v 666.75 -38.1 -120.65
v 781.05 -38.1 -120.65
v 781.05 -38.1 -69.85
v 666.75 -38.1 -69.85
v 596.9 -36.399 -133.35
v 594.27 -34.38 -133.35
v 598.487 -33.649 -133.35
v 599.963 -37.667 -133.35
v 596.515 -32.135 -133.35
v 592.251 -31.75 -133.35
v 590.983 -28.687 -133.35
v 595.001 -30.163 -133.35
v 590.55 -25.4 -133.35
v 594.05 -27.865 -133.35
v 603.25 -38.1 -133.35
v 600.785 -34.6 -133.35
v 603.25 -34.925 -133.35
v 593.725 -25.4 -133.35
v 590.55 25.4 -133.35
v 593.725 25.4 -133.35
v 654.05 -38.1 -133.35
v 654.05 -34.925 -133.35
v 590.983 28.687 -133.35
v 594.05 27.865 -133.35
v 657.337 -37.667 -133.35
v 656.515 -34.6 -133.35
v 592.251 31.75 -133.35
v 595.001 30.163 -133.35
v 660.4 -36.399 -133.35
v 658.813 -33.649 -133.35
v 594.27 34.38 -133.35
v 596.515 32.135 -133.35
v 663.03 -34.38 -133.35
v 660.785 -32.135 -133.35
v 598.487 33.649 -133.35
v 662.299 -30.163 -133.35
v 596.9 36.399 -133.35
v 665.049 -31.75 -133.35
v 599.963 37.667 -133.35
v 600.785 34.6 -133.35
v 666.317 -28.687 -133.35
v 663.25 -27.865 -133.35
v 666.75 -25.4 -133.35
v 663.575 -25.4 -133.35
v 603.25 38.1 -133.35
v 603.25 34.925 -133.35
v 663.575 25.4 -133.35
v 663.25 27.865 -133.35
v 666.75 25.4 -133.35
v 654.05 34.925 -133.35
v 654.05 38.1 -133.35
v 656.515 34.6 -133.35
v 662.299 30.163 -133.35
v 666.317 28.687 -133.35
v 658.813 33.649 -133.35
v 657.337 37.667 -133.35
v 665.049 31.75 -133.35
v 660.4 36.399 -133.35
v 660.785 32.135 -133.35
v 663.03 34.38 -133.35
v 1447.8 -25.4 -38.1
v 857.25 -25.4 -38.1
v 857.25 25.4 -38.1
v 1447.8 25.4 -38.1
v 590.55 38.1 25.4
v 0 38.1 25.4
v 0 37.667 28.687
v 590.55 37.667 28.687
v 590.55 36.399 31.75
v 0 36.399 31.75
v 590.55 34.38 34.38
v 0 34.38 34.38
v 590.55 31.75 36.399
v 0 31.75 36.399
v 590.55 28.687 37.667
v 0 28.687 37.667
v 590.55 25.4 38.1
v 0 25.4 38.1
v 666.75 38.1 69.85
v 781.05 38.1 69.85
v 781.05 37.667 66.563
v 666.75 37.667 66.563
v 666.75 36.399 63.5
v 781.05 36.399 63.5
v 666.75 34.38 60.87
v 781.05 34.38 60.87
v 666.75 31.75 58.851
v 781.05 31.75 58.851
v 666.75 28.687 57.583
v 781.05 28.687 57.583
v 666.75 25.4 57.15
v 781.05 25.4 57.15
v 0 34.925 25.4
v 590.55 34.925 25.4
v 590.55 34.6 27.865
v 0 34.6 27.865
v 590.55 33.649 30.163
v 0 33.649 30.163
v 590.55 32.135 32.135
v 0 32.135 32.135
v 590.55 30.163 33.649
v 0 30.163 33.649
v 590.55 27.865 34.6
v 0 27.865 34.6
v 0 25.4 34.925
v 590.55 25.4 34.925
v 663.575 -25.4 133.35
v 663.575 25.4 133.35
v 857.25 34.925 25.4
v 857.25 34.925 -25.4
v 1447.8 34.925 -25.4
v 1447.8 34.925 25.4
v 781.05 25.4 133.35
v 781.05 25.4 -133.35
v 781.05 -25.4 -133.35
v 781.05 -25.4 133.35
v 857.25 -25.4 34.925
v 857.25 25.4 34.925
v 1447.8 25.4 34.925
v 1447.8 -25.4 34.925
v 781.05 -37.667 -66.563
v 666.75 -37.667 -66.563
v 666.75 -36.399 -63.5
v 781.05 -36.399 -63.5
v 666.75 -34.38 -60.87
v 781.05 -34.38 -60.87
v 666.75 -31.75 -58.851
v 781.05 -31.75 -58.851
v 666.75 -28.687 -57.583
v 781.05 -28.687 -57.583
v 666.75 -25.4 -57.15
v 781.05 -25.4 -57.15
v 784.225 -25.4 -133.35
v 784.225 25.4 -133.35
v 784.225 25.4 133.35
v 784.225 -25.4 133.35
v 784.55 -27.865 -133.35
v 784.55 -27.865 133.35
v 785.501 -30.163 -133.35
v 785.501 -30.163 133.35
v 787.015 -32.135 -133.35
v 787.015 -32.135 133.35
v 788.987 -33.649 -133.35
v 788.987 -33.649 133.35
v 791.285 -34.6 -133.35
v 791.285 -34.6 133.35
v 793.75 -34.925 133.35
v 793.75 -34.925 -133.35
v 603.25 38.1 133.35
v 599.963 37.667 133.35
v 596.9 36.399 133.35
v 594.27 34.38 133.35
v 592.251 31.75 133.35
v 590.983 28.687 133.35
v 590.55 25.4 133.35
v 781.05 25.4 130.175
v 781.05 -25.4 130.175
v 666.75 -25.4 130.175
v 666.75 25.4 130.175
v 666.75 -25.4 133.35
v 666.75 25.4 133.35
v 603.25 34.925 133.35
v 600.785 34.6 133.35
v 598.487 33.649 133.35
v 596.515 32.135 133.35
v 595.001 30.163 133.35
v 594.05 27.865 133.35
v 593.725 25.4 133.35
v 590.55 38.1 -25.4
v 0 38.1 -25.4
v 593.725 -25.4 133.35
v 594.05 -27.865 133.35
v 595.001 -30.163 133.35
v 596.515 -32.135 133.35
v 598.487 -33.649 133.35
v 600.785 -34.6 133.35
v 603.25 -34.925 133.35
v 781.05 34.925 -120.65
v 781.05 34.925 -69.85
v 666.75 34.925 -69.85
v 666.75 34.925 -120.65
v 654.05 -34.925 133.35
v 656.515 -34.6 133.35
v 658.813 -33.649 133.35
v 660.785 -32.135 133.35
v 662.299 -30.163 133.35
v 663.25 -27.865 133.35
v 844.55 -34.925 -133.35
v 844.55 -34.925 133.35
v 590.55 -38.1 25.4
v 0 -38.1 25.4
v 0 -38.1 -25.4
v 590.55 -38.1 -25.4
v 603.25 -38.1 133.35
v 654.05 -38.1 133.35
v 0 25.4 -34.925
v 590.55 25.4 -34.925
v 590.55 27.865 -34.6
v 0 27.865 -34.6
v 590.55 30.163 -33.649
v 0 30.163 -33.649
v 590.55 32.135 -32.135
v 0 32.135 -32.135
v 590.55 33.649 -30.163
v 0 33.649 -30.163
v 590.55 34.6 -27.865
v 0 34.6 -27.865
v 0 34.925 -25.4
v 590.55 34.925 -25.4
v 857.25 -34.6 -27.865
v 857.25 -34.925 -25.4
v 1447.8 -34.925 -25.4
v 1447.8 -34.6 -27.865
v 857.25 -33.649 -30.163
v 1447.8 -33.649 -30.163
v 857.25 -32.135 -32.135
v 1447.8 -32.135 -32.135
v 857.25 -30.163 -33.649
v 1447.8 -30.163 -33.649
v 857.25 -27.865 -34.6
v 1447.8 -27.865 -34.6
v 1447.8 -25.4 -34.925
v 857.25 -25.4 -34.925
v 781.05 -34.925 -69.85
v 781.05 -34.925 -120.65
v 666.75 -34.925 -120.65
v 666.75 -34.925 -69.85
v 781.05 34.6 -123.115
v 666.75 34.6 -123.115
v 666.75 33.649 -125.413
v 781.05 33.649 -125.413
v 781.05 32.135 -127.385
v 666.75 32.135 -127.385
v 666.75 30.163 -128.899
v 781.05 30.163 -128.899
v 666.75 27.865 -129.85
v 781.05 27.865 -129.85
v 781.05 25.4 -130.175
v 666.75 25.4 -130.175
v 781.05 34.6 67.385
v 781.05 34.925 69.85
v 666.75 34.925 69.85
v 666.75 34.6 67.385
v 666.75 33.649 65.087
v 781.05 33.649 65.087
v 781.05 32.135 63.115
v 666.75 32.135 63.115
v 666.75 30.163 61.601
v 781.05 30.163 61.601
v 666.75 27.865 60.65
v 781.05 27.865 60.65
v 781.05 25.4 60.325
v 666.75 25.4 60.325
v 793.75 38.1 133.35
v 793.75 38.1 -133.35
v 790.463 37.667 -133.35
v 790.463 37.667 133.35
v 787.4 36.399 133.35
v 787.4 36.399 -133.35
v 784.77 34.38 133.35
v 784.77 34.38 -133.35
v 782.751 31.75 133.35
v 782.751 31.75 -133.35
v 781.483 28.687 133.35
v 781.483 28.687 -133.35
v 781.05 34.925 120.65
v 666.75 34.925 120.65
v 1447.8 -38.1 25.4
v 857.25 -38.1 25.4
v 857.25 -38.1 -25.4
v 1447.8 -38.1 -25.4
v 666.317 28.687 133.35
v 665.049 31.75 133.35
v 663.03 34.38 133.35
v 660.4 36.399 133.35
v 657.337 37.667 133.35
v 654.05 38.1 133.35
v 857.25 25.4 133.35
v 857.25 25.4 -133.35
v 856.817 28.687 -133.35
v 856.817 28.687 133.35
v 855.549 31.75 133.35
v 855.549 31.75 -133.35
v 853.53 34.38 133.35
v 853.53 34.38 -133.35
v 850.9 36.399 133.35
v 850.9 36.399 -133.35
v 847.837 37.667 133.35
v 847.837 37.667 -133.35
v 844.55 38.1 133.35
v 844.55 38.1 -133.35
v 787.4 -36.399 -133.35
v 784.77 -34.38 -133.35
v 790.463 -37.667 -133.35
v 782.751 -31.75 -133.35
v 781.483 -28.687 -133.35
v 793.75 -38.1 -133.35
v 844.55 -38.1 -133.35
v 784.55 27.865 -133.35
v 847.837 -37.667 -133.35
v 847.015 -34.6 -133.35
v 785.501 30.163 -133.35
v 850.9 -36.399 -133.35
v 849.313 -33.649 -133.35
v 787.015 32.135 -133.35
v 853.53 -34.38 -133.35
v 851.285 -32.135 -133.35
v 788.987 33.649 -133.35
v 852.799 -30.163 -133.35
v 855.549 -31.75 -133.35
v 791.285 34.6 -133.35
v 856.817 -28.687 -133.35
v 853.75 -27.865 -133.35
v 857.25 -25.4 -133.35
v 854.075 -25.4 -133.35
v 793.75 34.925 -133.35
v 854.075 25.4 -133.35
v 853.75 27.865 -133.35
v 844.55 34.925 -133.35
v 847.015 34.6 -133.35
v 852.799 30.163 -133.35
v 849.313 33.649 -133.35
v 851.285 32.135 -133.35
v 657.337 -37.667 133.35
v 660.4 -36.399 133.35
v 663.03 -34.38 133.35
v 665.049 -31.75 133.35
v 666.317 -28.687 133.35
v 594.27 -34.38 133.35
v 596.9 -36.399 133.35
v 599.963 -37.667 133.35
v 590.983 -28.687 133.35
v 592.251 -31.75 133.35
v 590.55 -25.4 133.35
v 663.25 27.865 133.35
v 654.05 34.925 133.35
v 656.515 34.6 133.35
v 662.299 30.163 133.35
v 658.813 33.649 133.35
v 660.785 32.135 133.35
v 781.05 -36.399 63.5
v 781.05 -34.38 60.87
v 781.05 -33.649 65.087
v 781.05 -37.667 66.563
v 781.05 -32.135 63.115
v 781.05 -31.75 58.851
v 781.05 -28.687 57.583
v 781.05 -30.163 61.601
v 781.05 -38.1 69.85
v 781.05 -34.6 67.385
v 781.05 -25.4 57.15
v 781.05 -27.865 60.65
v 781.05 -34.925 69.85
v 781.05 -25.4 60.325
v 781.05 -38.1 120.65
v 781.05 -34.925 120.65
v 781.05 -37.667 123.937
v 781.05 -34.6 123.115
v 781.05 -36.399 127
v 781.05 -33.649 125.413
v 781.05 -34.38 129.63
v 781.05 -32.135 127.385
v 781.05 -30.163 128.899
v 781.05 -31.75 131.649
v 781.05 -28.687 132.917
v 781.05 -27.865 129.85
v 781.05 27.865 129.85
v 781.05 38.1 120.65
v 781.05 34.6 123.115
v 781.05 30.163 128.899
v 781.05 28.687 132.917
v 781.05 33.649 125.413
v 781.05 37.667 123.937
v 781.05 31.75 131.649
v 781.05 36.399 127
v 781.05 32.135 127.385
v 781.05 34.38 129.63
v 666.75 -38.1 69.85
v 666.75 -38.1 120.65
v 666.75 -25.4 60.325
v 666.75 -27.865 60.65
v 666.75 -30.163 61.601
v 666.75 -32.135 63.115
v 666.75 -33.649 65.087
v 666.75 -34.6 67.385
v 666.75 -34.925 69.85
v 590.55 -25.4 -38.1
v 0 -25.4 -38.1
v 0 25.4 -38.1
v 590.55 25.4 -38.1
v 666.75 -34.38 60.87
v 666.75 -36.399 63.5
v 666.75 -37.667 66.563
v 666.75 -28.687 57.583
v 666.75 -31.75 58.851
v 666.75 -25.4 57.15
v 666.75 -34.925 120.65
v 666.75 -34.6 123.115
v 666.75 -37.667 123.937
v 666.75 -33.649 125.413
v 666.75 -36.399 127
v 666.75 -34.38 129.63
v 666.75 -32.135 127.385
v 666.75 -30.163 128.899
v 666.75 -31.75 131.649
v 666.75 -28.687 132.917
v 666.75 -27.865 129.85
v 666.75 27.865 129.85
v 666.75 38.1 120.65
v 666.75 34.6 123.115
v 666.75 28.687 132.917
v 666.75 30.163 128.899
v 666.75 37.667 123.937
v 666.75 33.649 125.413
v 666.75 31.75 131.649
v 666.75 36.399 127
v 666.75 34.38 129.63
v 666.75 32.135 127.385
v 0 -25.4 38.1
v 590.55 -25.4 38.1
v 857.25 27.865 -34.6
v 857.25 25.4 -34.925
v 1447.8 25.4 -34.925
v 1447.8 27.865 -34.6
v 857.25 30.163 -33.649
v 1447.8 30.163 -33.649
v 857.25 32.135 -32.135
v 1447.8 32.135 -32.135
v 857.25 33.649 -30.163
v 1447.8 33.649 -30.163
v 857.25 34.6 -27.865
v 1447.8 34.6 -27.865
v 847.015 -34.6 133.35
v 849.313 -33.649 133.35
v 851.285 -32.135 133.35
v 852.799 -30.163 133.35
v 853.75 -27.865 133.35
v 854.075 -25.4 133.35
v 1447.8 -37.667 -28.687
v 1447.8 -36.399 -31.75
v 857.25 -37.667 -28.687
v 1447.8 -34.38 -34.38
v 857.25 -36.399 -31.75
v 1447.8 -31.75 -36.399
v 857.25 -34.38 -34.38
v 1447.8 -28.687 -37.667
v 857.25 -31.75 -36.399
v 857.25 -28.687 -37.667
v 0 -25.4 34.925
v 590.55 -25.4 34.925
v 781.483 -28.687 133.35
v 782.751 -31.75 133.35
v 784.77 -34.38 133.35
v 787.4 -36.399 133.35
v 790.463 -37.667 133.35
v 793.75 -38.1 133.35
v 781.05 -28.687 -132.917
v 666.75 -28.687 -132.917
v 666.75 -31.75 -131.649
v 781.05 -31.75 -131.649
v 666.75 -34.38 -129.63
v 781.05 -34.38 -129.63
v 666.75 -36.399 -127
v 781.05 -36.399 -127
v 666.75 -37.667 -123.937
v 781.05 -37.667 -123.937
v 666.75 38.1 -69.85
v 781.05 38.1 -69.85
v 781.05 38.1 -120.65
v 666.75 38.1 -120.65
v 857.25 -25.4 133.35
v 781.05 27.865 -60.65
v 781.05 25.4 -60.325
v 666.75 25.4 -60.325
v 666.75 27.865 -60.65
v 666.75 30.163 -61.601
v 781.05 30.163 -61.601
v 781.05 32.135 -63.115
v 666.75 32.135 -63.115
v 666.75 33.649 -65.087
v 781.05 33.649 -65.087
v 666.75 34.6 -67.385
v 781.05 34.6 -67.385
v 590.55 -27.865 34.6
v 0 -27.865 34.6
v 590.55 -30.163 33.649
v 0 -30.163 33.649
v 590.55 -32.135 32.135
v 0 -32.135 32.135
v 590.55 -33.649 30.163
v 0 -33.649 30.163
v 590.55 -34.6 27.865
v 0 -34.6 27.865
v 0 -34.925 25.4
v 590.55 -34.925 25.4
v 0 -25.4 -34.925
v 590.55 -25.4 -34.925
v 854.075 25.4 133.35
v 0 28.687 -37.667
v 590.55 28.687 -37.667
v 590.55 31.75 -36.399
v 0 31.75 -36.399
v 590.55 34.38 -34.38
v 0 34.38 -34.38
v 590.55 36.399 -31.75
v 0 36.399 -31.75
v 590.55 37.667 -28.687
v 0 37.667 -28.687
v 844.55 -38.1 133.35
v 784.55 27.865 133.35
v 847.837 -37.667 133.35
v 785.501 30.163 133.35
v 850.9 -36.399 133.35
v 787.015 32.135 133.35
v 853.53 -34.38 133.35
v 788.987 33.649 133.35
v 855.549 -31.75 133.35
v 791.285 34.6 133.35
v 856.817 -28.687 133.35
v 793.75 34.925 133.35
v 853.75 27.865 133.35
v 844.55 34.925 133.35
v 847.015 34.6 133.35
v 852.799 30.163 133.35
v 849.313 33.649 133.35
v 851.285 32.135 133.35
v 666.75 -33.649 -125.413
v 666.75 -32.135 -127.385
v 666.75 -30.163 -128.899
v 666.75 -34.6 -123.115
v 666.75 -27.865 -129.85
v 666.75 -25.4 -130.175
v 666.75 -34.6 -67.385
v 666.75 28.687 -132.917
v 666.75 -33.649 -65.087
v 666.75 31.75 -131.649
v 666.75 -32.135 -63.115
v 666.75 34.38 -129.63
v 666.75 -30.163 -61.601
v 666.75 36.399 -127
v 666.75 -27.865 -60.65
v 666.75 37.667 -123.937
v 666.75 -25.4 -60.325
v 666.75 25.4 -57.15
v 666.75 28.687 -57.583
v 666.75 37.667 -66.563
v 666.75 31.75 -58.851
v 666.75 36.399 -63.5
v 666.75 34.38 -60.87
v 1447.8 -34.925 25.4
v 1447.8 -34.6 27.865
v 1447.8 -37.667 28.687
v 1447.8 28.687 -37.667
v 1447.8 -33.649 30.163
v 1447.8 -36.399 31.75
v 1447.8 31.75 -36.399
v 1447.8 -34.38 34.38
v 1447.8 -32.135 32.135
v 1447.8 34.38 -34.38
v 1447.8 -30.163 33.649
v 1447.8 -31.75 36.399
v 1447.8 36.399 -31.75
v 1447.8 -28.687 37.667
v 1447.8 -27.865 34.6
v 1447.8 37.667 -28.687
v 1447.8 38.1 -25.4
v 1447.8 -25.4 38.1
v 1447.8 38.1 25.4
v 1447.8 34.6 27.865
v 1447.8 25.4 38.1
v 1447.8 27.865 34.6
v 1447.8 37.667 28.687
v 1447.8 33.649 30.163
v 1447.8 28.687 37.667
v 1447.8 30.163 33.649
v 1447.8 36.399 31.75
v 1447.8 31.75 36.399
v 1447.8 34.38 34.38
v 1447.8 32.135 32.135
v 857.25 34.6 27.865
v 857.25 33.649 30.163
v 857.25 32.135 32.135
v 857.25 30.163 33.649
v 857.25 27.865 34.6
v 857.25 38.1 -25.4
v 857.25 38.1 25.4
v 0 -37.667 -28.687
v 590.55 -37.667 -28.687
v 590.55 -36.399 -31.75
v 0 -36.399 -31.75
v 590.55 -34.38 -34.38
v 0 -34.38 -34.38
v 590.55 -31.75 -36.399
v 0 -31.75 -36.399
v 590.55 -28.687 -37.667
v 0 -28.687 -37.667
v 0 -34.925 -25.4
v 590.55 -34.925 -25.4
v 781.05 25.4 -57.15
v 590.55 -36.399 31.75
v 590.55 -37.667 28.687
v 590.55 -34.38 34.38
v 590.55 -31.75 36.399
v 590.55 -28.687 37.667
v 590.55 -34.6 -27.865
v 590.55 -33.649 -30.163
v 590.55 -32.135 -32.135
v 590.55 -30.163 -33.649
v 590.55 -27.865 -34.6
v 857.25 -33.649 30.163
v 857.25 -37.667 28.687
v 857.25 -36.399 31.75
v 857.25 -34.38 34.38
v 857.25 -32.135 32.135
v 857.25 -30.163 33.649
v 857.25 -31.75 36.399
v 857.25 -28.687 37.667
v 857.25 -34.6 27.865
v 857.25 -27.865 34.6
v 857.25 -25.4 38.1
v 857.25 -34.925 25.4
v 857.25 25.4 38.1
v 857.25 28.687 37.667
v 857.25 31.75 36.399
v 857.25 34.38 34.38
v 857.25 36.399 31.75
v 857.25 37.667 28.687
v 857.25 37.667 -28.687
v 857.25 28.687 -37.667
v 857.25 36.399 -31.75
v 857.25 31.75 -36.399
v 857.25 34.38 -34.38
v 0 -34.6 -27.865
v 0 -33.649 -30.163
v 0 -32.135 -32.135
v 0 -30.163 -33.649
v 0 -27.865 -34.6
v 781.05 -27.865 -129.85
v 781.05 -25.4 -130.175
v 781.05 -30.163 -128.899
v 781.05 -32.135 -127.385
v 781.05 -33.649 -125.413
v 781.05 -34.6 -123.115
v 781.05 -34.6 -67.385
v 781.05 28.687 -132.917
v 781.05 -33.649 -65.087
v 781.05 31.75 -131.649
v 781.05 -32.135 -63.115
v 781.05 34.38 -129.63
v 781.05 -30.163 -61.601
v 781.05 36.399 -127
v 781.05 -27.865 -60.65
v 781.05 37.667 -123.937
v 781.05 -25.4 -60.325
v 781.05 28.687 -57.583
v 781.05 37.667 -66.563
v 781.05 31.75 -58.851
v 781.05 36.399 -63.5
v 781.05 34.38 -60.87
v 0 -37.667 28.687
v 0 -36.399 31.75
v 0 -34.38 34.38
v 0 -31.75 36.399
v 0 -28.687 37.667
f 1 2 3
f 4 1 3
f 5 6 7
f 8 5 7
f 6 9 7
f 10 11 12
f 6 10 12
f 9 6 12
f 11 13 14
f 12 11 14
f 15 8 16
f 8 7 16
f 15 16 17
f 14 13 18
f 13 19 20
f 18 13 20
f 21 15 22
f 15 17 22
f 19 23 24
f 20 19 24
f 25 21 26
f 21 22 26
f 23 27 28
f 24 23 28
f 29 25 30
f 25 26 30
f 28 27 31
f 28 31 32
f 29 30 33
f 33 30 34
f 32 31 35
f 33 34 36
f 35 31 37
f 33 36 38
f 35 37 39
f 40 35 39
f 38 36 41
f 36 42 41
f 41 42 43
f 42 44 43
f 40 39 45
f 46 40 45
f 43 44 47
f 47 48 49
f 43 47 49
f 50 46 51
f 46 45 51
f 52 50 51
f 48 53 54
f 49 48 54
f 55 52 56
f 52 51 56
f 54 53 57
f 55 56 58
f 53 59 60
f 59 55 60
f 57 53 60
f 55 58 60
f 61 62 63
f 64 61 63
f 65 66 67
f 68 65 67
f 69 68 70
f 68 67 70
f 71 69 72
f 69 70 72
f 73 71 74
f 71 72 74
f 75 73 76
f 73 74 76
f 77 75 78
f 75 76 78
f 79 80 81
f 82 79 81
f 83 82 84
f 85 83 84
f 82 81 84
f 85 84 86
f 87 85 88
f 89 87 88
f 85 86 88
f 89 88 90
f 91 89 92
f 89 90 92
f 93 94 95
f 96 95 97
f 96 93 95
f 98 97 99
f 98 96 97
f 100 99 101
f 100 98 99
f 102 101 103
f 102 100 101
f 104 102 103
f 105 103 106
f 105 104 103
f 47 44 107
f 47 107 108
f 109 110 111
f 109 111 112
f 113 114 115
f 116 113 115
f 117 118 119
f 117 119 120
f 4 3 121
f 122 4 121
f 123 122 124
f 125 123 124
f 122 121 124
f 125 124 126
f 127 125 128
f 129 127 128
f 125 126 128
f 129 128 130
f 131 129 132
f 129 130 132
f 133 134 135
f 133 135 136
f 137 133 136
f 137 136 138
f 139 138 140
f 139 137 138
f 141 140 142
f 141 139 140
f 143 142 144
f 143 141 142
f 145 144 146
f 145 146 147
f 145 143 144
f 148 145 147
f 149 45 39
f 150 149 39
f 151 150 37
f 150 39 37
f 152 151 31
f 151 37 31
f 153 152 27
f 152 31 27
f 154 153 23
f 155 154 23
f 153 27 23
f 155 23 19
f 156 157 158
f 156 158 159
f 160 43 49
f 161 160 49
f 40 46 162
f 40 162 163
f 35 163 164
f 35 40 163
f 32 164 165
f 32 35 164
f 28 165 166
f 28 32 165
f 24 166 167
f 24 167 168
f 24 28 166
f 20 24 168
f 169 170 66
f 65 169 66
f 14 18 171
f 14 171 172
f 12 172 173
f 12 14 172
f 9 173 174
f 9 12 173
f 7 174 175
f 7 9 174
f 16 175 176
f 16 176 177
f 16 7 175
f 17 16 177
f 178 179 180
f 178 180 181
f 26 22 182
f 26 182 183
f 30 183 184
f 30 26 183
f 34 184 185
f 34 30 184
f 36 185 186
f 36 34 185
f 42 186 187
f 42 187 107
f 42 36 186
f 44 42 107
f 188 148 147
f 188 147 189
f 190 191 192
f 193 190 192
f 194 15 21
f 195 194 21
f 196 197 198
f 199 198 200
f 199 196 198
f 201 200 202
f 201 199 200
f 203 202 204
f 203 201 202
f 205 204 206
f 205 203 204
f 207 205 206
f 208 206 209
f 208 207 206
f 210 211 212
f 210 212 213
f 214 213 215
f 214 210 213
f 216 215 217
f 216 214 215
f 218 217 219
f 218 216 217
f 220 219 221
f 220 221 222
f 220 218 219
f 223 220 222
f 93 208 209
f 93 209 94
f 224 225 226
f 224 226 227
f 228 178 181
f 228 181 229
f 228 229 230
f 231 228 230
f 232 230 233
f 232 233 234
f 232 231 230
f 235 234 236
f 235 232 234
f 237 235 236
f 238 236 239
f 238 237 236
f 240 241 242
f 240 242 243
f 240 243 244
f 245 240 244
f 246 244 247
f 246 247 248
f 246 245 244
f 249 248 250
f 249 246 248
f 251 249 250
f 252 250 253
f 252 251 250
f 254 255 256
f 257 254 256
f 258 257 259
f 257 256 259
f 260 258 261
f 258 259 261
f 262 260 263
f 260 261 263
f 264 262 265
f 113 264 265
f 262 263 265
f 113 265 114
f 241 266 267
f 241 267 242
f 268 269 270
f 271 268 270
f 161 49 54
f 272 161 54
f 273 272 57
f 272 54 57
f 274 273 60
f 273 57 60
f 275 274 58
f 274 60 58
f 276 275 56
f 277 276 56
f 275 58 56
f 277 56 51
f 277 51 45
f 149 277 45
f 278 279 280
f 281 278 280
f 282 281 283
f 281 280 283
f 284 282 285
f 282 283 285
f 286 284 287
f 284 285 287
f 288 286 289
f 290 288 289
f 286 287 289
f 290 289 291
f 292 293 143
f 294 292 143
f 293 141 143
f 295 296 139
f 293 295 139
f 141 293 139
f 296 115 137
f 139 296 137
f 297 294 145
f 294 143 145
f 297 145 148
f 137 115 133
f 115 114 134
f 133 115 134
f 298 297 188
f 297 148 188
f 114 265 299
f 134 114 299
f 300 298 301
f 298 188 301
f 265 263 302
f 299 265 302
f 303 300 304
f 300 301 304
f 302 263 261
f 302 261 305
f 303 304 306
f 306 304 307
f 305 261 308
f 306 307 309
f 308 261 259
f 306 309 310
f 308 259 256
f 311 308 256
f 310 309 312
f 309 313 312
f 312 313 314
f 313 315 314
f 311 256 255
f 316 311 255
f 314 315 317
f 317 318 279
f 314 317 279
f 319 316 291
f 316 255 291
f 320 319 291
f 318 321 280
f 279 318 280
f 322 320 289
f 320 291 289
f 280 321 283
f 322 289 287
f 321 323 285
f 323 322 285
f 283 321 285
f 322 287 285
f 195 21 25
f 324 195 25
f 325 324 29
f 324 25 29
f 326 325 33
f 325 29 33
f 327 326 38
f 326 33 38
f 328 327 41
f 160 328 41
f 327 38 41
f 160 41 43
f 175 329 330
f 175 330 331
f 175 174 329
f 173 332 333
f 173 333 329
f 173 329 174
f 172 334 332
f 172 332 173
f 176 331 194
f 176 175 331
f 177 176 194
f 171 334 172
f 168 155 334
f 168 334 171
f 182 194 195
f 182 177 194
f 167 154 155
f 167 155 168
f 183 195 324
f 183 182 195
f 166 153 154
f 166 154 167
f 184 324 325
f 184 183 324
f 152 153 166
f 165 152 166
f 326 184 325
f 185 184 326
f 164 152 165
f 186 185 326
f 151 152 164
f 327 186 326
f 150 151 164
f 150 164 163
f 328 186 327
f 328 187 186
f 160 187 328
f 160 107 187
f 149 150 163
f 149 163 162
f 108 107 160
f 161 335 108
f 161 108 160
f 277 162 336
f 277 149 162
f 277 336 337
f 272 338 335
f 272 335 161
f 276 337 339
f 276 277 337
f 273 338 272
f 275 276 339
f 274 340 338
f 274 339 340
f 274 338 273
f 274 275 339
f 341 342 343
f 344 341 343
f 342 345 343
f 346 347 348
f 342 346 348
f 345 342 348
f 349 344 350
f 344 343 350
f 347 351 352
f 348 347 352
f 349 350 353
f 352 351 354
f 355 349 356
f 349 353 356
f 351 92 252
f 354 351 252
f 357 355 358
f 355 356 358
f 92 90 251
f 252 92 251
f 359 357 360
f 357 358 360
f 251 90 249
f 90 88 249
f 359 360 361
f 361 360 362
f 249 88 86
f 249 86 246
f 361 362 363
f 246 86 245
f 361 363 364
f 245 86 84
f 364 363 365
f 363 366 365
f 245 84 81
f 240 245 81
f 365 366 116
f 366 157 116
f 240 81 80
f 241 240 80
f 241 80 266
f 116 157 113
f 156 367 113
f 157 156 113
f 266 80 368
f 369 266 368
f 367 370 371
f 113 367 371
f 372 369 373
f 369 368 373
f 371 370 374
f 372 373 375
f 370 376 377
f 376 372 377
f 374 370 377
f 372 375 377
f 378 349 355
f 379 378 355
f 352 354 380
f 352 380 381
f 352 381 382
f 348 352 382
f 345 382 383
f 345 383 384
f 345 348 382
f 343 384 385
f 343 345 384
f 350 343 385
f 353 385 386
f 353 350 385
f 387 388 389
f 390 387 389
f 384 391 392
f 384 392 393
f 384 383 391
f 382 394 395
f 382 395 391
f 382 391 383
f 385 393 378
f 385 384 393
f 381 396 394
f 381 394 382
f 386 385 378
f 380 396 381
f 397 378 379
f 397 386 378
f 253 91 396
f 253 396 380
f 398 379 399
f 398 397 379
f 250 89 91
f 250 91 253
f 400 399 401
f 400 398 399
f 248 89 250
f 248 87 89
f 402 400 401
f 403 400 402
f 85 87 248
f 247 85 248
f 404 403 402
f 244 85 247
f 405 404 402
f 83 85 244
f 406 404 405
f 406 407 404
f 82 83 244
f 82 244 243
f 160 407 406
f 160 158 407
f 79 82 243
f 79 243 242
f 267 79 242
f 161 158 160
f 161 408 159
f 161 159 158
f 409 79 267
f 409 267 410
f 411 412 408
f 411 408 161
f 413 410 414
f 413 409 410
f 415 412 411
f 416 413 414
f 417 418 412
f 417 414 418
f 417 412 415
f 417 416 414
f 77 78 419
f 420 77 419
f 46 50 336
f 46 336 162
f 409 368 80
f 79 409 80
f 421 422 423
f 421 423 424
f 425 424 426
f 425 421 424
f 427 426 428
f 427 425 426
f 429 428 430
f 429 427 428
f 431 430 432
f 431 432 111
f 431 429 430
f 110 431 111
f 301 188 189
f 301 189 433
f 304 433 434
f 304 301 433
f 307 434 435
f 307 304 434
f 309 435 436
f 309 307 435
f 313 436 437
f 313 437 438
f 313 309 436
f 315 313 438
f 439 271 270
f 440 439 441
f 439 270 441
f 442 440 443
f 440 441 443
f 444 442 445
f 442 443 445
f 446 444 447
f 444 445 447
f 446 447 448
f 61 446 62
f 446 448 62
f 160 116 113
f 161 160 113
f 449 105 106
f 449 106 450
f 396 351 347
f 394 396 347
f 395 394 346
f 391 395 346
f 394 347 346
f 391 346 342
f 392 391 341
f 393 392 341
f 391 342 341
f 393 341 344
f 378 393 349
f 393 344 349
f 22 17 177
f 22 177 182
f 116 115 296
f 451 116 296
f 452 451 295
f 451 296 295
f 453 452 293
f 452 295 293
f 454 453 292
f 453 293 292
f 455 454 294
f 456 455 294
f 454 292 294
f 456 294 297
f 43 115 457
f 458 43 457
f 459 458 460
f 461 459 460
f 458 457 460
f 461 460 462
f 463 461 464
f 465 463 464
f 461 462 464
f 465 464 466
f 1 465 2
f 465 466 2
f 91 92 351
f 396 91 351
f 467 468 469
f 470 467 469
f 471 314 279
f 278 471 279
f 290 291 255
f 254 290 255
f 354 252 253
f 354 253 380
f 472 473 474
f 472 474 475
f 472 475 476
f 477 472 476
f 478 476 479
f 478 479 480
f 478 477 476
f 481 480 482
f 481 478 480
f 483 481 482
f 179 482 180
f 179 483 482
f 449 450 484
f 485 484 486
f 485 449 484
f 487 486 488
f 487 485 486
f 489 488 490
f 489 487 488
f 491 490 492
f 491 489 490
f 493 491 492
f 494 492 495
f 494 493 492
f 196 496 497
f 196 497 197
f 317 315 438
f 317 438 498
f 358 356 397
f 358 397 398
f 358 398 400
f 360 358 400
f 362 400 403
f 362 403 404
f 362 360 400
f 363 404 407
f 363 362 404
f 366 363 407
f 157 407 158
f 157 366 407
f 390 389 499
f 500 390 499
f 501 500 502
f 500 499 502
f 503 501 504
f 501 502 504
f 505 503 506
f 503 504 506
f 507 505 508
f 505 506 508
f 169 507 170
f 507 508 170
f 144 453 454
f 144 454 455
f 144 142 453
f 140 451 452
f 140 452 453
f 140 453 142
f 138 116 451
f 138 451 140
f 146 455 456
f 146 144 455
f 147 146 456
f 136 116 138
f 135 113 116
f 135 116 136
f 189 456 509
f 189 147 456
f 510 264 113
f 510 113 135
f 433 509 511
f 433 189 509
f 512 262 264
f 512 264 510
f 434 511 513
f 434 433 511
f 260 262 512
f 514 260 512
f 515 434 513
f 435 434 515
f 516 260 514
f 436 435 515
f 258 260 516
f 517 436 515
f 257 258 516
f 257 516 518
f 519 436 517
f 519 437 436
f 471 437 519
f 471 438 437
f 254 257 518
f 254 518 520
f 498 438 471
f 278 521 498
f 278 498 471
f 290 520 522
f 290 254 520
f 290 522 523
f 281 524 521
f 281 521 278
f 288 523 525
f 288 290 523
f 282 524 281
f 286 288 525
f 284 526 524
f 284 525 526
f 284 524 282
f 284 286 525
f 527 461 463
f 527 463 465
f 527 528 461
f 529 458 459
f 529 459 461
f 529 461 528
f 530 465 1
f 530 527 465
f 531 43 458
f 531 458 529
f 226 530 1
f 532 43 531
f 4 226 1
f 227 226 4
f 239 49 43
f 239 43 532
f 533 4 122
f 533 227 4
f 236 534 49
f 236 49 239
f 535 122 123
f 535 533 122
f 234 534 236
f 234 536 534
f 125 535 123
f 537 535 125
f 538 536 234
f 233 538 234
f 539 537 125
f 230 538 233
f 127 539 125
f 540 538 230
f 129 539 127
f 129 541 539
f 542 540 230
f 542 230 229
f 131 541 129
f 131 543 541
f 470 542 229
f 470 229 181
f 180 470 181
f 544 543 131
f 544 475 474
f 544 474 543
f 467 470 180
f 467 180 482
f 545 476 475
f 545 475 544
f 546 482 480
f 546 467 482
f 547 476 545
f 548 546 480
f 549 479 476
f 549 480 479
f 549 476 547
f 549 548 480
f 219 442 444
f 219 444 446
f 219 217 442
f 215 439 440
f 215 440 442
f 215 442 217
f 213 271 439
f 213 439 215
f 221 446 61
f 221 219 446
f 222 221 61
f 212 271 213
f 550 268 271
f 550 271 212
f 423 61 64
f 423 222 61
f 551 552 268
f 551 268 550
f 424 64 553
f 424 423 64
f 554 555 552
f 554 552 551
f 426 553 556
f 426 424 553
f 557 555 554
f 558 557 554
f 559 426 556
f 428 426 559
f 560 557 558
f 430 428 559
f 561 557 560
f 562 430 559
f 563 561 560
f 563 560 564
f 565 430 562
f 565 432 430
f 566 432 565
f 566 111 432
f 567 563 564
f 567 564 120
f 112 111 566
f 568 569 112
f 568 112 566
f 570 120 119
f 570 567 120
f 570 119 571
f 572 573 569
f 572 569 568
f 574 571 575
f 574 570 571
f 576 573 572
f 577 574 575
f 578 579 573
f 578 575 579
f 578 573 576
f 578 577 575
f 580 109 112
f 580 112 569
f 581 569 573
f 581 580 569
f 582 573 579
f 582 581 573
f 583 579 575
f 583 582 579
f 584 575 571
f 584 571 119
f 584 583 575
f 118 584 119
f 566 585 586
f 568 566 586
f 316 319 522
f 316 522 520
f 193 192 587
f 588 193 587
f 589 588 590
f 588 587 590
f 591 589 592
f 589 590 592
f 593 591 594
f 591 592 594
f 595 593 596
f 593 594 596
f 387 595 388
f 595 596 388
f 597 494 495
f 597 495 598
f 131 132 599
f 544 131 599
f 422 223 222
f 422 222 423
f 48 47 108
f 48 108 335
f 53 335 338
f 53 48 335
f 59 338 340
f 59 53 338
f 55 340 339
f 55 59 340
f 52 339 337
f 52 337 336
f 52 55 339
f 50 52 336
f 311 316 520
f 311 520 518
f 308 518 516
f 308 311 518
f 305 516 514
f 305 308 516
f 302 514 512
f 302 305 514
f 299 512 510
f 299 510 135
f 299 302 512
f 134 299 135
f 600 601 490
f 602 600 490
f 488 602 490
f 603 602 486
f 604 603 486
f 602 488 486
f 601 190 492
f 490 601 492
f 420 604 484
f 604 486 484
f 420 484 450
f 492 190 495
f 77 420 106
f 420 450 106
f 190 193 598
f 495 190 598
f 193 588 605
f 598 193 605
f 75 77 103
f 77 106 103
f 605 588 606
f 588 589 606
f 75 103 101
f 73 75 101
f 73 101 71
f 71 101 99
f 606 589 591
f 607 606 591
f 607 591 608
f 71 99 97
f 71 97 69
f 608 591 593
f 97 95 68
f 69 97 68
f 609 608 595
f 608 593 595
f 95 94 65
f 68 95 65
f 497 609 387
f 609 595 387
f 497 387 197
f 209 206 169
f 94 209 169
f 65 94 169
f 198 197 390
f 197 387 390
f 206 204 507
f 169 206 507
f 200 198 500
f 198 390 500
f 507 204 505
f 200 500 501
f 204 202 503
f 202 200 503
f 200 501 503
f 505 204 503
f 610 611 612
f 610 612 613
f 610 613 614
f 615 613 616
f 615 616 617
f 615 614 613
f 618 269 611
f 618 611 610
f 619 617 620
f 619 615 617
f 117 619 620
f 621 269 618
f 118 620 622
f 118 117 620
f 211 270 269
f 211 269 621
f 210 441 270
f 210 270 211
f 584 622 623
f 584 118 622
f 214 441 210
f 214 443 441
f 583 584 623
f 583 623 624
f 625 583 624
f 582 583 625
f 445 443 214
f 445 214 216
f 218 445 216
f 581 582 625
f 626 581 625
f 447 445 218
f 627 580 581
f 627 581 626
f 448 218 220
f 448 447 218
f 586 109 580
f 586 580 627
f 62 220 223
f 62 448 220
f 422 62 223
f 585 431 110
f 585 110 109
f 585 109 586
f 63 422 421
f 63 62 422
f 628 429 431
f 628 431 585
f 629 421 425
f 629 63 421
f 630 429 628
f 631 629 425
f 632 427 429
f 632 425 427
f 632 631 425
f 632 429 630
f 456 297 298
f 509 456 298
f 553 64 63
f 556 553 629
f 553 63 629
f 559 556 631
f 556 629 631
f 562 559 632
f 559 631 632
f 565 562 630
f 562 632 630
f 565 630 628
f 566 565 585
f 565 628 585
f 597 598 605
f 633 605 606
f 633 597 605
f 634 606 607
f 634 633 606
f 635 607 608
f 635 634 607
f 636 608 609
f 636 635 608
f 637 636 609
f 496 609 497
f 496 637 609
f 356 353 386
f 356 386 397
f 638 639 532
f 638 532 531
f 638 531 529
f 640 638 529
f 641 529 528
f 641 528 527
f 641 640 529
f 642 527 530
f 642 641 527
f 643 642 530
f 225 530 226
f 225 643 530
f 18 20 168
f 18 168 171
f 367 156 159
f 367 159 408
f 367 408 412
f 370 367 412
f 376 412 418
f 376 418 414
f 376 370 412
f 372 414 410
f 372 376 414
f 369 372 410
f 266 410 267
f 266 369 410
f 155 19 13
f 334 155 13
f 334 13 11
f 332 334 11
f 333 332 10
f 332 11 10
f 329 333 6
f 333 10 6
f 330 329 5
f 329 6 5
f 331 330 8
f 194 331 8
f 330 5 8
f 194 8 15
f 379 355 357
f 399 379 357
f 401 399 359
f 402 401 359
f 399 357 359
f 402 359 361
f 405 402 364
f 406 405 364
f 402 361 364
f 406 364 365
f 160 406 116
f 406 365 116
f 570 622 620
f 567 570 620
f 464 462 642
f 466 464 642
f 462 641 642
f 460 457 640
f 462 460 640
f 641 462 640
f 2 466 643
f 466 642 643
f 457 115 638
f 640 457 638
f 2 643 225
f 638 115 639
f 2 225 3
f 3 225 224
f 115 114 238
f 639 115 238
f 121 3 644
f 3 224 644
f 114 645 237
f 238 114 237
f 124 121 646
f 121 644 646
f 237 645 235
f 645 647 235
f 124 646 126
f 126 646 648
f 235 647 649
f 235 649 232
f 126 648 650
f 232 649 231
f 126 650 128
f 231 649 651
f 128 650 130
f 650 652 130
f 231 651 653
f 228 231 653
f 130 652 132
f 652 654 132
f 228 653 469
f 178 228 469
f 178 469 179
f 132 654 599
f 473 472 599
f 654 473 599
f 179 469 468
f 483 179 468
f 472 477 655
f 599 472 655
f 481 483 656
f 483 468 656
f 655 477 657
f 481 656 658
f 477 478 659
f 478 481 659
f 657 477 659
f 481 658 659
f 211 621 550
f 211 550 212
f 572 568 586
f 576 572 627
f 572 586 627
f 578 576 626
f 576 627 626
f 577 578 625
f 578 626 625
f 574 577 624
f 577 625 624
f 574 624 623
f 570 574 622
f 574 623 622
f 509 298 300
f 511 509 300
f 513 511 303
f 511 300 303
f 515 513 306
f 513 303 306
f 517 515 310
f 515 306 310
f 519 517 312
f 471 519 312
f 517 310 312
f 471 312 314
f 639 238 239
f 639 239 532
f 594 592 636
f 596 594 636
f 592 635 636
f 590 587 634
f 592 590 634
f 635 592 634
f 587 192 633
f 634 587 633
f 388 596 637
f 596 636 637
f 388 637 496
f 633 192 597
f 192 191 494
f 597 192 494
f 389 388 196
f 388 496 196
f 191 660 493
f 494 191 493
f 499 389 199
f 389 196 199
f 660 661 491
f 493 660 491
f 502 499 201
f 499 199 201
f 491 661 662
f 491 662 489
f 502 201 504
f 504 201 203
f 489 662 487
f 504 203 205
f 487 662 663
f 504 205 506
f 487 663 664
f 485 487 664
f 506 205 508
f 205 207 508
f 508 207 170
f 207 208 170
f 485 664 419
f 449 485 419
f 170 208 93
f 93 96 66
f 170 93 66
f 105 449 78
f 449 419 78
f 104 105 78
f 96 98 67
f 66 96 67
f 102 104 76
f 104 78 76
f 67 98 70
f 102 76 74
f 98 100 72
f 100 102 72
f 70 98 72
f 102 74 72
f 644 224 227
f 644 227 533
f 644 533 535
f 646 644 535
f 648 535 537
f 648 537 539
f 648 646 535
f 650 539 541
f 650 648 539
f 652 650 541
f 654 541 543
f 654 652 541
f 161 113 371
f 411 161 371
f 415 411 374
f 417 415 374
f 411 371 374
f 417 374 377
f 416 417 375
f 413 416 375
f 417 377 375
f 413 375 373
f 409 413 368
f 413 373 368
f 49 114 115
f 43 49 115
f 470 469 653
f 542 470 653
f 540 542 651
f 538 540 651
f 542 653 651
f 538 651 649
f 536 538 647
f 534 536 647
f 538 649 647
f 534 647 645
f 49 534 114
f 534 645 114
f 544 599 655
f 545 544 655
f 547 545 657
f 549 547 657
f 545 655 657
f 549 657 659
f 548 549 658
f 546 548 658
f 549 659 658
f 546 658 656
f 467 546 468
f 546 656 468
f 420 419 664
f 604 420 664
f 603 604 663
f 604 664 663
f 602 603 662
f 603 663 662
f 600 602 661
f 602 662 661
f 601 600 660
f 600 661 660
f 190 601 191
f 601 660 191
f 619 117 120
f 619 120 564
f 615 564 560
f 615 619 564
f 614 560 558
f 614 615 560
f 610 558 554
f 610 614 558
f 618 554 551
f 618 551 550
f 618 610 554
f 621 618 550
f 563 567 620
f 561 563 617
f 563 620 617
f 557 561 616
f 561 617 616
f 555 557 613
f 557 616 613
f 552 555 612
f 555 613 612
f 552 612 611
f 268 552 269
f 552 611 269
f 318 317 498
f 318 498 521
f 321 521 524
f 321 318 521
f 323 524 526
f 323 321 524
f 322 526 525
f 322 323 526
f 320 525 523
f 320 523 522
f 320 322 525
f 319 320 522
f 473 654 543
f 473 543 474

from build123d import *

# Parameters (mm, degrees)
STRUCTURAL_MEMBER1_DEPTH   = 1447.8
SKETCH12_W                 = 266.7
SKETCH12_H                 = 76.2
CUT_EXTRUDE1_DEPTH         = 1451.304412873
STRUCTURAL_MEMBER2_DEPTH   = 266.7
STRUCTURAL_MEMBER2_2_DEPTH = 266.7
STRUCTURAL_MEMBER3_DEPTH   = 114.3
STRUCTURAL_MEMBER3_2_DEPTH = 114.3


with BuildPart() as part:
    # Sketch11 → Structural Member1 (new body)
    with BuildSketch(Plane.YZ):
        with BuildLine():
            Line((-25.4, -38.1), (25.4, -38.1))
            ThreePointArc((25.4, -38.1), (34.380256121, -34.380256121), (38.1, -25.4))
            Line((38.1, -25.4), (38.1, 25.4))
            ThreePointArc((38.1, 25.4), (34.380256121, 34.380256121), (25.4, 38.1))
            Line((25.4, 38.1), (-25.4, 38.1))
            ThreePointArc((-25.4, 38.1), (-34.380256121, 34.380256121), (-38.1, 25.4))
            Line((-38.1, 25.4), (-38.1, -25.4))
            ThreePointArc((-38.1, -25.4), (-34.380256121, -34.380256121), (-25.4, -38.1))
        make_face()
        with BuildLine():
            Line((-25.4, -34.925), (25.4, -34.925))
            ThreePointArc((25.4, -34.925), (32.135192091, -32.135192091), (34.925, -25.4))
            Line((34.925, -25.4), (34.925, 25.4))
            ThreePointArc((34.925, 25.4), (32.135192091, 32.135192091), (25.4, 34.925))
            Line((25.4, 34.925), (-25.4, 34.925))
            ThreePointArc((-25.4, 34.925), (-32.135192091, 32.135192091), (-34.925, 25.4))
            Line((-34.925, 25.4), (-34.925, -25.4))
            ThreePointArc((-34.925, -25.4), (-32.135192091, -32.135192091), (-25.4, -34.925))
        make_face(mode=Mode.SUBTRACT)
    extrude(amount=STRUCTURAL_MEMBER1_DEPTH)

    # Sketch12 → Cut-Extrude1 (cut, through all)
    with BuildSketch(Plane(origin=(0, 0, -38.1), x_dir=(-1, 0, 0), z_dir=(0, 0, -1))):
        with Locations((-723.9, 0)):
            Rectangle(SKETCH12_W, SKETCH12_H)
    extrude(amount=-CUT_EXTRUDE1_DEPTH, mode=Mode.SUBTRACT)


with BuildPart() as cut_extrude1_piece_1:
    # of the separate pieces the step leaves, piece 1, a body of its own (cut_extrude1_pieces)
    add(part.part.solids().sort_by_distance((857.25, -25.4, -38.1))[0])


with BuildPart() as cut_extrude1_piece_2:
    # of the separate pieces the step leaves, piece 2, a body of its own (cut_extrude1_pieces)
    add(part.part.solids().sort_by_distance((0, -25.4, -38.1))[0])


with BuildPart() as body_3:
    # Sketch15 → Structural Member2 (new body)
    with BuildSketch(Plane(origin=(628.65, 0, -133.35), x_dir=(1, 0, 0), z_dir=(0, 0, 1))):
        with BuildLine():
            Line((-25.4, -38.1), (25.4, -38.1))
            ThreePointArc((25.4, -38.1), (34.380256121, -34.380256121), (38.1, -25.4))
            Line((38.1, -25.4), (38.1, 25.4))
            ThreePointArc((38.1, 25.4), (34.380256121, 34.380256121), (25.4, 38.1))
            Line((25.4, 38.1), (-25.4, 38.1))
            ThreePointArc((-25.4, 38.1), (-34.380256121, 34.380256121), (-38.1, 25.4))
            Line((-38.1, 25.4), (-38.1, -25.4))
            ThreePointArc((-38.1, -25.4), (-34.380256121, -34.380256121), (-25.4, -38.1))
        make_face()
        with BuildLine():
            Line((-25.4, -34.925), (25.4, -34.925))
            ThreePointArc((25.4, -34.925), (32.135192091, -32.135192091), (34.925, -25.4))
            Line((34.925, -25.4), (34.925, 25.4))
            ThreePointArc((34.925, 25.4), (32.135192091, 32.135192091), (25.4, 34.925))
            Line((25.4, 34.925), (-25.4, 34.925))
            ThreePointArc((-25.4, 34.925), (-32.135192091, 32.135192091), (-34.925, 25.4))
            Line((-34.925, 25.4), (-34.925, -25.4))
            ThreePointArc((-34.925, -25.4), (-32.135192091, -32.135192091), (-25.4, -34.925))
        make_face(mode=Mode.SUBTRACT)
    extrude(amount=STRUCTURAL_MEMBER2_DEPTH)


with BuildPart() as body_4:
    # Sketch15 on segment 2 (carried to segment 2) → Structural Member2 2 (new body)
    with BuildSketch(Plane(origin=(819.15, 0, -133.35), x_dir=(1, 0, 0), z_dir=(0, 0, 1))):
        with BuildLine():
            Line((-25.4, -38.1), (25.4, -38.1))
            ThreePointArc((25.4, -38.1), (34.380256121, -34.380256121), (38.1, -25.4))
            Line((38.1, -25.4), (38.1, 25.4))
            ThreePointArc((38.1, 25.4), (34.380256121, 34.380256121), (25.4, 38.1))
            Line((25.4, 38.1), (-25.4, 38.1))
            ThreePointArc((-25.4, 38.1), (-34.380256121, 34.380256121), (-38.1, 25.4))
            Line((-38.1, 25.4), (-38.1, -25.4))
            ThreePointArc((-38.1, -25.4), (-34.380256121, -34.380256121), (-25.4, -38.1))
        make_face()
        with BuildLine():
            Line((-25.4, -34.925), (25.4, -34.925))
            ThreePointArc((25.4, -34.925), (32.135192091, -32.135192091), (34.925, -25.4))
            Line((34.925, -25.4), (34.925, 25.4))
            ThreePointArc((34.925, 25.4), (32.135192091, 32.135192091), (25.4, 34.925))
            Line((25.4, 34.925), (-25.4, 34.925))
            ThreePointArc((-25.4, 34.925), (-32.135192091, 32.135192091), (-34.925, 25.4))
            Line((-34.925, 25.4), (-34.925, -25.4))
            ThreePointArc((-34.925, -25.4), (-32.135192091, -32.135192091), (-25.4, -34.925))
        make_face(mode=Mode.SUBTRACT)
    extrude(amount=STRUCTURAL_MEMBER2_2_DEPTH)


with BuildPart() as body_5:
    # Sketch17 → Structural Member3 (new body)
    with BuildSketch(Plane(origin=(781.05, 0, -95.25), x_dir=(0, 0, 1), z_dir=(-1, 0, 0))):
        with BuildLine():
            Line((-25.4, -38.1), (25.4, -38.1))
            ThreePointArc((25.4, -38.1), (34.380256121, -34.380256121), (38.1, -25.4))
            Line((38.1, -25.4), (38.1, 25.4))
            ThreePointArc((38.1, 25.4), (34.380256121, 34.380256121), (25.4, 38.1))
            Line((25.4, 38.1), (-25.4, 38.1))
            ThreePointArc((-25.4, 38.1), (-34.380256121, 34.380256121), (-38.1, 25.4))
            Line((-38.1, 25.4), (-38.1, -25.4))
            ThreePointArc((-38.1, -25.4), (-34.380256121, -34.380256121), (-25.4, -38.1))
        make_face()
        with BuildLine():
            Line((-25.4, -34.925), (25.4, -34.925))
            ThreePointArc((25.4, -34.925), (32.135192091, -32.135192091), (34.925, -25.4))
            Line((34.925, -25.4), (34.925, 25.4))
            ThreePointArc((34.925, 25.4), (32.135192091, 32.135192091), (25.4, 34.925))
            Line((25.4, 34.925), (-25.4, 34.925))
            ThreePointArc((-25.4, 34.925), (-32.135192091, 32.135192091), (-34.925, 25.4))
            Line((-34.925, 25.4), (-34.925, -25.4))
            ThreePointArc((-34.925, -25.4), (-32.135192091, -32.135192091), (-25.4, -34.925))
        make_face(mode=Mode.SUBTRACT)
    extrude(amount=STRUCTURAL_MEMBER3_DEPTH)


with BuildPart() as body_6:
    # Sketch17 on segment 2 (carried to segment 2) → Structural Member3 2 (new body)
    with BuildSketch(Plane(origin=(781.05, 0, 95.25), x_dir=(0, 0, 1), z_dir=(-1, 0, 0))):
        with BuildLine():
            Line((-25.4, -38.1), (25.4, -38.1))
            ThreePointArc((25.4, -38.1), (34.380256121, -34.380256121), (38.1, -25.4))
            Line((38.1, -25.4), (38.1, 25.4))
            ThreePointArc((38.1, 25.4), (34.380256121, 34.380256121), (25.4, 38.1))
            Line((25.4, 38.1), (-25.4, 38.1))
            ThreePointArc((-25.4, 38.1), (-34.380256121, 34.380256121), (-38.1, 25.4))
            Line((-38.1, 25.4), (-38.1, -25.4))
            ThreePointArc((-38.1, -25.4), (-34.380256121, -34.380256121), (-25.4, -38.1))
        make_face()
        with BuildLine():
            Line((-25.4, -34.925), (25.4, -34.925))
            ThreePointArc((25.4, -34.925), (32.135192091, -32.135192091), (34.925, -25.4))
            Line((34.925, -25.4), (34.925, 25.4))
            ThreePointArc((34.925, 25.4), (32.135192091, 32.135192091), (25.4, 34.925))
            Line((25.4, 34.925), (-25.4, 34.925))
            ThreePointArc((-25.4, 34.925), (-32.135192091, 32.135192091), (-34.925, 25.4))
            Line((-34.925, 25.4), (-34.925, -25.4))
            ThreePointArc((-34.925, -25.4), (-32.135192091, -32.135192091), (-25.4, -34.925))
        make_face(mode=Mode.SUBTRACT)
    extrude(amount=STRUCTURAL_MEMBER3_2_DEPTH)


solid = Compound([cut_extrude1_piece_1.part, cut_extrude1_piece_2.part, body_3.part, body_4.part, body_5.part, body_6.part])
